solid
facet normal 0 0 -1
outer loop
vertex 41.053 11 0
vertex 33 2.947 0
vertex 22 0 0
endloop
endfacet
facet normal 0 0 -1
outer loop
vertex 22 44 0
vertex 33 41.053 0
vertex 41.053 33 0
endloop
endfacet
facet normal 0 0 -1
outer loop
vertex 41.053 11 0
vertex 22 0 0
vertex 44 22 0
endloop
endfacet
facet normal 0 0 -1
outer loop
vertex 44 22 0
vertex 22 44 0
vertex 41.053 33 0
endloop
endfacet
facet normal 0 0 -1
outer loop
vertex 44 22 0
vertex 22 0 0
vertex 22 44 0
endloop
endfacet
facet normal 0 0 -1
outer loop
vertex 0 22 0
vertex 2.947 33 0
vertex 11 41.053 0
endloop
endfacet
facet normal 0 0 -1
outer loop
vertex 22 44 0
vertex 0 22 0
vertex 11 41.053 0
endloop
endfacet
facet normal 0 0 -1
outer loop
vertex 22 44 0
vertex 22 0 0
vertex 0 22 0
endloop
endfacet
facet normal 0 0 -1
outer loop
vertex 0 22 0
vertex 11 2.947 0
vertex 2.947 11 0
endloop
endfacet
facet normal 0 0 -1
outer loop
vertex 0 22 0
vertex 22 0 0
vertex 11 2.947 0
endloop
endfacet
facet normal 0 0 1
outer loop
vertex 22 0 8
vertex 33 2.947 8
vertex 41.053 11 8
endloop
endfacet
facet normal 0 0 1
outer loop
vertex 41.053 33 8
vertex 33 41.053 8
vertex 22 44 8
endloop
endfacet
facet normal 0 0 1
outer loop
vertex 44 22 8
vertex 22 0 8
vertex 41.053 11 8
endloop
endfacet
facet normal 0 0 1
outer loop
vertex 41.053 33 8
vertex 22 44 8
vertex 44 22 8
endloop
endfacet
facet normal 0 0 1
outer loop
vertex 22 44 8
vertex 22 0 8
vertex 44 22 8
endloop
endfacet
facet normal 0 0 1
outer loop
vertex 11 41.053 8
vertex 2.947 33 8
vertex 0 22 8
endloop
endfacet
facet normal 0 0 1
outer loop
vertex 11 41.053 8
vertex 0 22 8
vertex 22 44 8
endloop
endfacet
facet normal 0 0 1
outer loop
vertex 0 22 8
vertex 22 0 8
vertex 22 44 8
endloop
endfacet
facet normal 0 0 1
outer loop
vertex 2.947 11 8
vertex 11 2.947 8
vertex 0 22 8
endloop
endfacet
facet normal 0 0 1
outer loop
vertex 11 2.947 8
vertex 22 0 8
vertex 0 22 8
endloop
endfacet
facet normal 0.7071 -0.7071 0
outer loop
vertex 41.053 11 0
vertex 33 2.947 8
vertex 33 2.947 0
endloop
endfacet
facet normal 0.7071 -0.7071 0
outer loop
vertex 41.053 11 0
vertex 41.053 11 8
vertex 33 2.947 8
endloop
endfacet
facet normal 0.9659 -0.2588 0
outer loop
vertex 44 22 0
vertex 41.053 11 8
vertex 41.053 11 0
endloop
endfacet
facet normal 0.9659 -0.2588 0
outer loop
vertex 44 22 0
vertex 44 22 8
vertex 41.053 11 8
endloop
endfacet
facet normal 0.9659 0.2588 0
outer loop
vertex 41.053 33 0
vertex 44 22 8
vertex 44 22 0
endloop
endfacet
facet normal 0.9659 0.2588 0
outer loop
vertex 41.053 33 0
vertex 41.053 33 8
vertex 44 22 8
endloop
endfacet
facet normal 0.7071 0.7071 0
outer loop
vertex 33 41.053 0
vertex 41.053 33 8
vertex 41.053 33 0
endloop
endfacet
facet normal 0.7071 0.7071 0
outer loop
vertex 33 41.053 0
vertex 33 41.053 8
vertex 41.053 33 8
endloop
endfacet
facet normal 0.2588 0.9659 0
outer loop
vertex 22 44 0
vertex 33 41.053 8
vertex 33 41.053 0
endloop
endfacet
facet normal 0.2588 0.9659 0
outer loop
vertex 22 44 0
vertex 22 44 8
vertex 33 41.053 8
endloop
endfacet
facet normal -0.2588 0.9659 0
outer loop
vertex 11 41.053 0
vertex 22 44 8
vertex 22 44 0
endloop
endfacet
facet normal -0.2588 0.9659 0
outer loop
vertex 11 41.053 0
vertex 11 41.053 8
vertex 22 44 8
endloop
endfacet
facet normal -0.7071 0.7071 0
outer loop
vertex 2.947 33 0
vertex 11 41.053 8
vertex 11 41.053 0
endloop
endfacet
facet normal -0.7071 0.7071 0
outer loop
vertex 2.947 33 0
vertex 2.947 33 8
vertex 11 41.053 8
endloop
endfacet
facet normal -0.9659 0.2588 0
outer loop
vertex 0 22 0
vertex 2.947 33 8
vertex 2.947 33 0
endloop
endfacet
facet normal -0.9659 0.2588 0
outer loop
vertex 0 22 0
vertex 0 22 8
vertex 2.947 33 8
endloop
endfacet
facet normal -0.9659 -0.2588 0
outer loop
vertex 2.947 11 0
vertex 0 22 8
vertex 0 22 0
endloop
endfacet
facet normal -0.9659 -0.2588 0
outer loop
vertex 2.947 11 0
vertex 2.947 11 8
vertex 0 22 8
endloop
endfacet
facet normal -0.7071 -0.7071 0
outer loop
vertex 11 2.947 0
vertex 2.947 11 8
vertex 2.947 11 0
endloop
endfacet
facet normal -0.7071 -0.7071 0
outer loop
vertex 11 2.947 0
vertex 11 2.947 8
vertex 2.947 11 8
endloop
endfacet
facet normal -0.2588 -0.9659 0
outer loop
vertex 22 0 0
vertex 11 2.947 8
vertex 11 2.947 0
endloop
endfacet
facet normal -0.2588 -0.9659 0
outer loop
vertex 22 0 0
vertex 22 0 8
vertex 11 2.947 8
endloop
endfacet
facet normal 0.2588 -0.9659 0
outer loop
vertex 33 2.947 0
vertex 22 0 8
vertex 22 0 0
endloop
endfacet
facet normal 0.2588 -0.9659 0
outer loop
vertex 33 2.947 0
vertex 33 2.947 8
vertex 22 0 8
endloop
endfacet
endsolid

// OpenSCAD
$fn = 32;

// ----------------------------------------------------------------------
// Flat adaptor: keyed, 8 mm thick
// ----------------------------------------------------------------------

// --- parameters (mm) ---
profile_height = 8;       // extrusion height
profile_points = 12;      // points of the closed outline

profile = [[0, 22], [2.947, 11], [11, 2.947], [22, 0], [33, 2.947], [41.053, 11], [44, 22], [41.053, 33], [33, 41.053], [22, 44], [11, 41.053], [2.947, 33]];  // single closed polygon, 12 points, counter clockwise

// --- the one profile operation ---
linear_extrude(height = profile_height) polygon(points = profile);
